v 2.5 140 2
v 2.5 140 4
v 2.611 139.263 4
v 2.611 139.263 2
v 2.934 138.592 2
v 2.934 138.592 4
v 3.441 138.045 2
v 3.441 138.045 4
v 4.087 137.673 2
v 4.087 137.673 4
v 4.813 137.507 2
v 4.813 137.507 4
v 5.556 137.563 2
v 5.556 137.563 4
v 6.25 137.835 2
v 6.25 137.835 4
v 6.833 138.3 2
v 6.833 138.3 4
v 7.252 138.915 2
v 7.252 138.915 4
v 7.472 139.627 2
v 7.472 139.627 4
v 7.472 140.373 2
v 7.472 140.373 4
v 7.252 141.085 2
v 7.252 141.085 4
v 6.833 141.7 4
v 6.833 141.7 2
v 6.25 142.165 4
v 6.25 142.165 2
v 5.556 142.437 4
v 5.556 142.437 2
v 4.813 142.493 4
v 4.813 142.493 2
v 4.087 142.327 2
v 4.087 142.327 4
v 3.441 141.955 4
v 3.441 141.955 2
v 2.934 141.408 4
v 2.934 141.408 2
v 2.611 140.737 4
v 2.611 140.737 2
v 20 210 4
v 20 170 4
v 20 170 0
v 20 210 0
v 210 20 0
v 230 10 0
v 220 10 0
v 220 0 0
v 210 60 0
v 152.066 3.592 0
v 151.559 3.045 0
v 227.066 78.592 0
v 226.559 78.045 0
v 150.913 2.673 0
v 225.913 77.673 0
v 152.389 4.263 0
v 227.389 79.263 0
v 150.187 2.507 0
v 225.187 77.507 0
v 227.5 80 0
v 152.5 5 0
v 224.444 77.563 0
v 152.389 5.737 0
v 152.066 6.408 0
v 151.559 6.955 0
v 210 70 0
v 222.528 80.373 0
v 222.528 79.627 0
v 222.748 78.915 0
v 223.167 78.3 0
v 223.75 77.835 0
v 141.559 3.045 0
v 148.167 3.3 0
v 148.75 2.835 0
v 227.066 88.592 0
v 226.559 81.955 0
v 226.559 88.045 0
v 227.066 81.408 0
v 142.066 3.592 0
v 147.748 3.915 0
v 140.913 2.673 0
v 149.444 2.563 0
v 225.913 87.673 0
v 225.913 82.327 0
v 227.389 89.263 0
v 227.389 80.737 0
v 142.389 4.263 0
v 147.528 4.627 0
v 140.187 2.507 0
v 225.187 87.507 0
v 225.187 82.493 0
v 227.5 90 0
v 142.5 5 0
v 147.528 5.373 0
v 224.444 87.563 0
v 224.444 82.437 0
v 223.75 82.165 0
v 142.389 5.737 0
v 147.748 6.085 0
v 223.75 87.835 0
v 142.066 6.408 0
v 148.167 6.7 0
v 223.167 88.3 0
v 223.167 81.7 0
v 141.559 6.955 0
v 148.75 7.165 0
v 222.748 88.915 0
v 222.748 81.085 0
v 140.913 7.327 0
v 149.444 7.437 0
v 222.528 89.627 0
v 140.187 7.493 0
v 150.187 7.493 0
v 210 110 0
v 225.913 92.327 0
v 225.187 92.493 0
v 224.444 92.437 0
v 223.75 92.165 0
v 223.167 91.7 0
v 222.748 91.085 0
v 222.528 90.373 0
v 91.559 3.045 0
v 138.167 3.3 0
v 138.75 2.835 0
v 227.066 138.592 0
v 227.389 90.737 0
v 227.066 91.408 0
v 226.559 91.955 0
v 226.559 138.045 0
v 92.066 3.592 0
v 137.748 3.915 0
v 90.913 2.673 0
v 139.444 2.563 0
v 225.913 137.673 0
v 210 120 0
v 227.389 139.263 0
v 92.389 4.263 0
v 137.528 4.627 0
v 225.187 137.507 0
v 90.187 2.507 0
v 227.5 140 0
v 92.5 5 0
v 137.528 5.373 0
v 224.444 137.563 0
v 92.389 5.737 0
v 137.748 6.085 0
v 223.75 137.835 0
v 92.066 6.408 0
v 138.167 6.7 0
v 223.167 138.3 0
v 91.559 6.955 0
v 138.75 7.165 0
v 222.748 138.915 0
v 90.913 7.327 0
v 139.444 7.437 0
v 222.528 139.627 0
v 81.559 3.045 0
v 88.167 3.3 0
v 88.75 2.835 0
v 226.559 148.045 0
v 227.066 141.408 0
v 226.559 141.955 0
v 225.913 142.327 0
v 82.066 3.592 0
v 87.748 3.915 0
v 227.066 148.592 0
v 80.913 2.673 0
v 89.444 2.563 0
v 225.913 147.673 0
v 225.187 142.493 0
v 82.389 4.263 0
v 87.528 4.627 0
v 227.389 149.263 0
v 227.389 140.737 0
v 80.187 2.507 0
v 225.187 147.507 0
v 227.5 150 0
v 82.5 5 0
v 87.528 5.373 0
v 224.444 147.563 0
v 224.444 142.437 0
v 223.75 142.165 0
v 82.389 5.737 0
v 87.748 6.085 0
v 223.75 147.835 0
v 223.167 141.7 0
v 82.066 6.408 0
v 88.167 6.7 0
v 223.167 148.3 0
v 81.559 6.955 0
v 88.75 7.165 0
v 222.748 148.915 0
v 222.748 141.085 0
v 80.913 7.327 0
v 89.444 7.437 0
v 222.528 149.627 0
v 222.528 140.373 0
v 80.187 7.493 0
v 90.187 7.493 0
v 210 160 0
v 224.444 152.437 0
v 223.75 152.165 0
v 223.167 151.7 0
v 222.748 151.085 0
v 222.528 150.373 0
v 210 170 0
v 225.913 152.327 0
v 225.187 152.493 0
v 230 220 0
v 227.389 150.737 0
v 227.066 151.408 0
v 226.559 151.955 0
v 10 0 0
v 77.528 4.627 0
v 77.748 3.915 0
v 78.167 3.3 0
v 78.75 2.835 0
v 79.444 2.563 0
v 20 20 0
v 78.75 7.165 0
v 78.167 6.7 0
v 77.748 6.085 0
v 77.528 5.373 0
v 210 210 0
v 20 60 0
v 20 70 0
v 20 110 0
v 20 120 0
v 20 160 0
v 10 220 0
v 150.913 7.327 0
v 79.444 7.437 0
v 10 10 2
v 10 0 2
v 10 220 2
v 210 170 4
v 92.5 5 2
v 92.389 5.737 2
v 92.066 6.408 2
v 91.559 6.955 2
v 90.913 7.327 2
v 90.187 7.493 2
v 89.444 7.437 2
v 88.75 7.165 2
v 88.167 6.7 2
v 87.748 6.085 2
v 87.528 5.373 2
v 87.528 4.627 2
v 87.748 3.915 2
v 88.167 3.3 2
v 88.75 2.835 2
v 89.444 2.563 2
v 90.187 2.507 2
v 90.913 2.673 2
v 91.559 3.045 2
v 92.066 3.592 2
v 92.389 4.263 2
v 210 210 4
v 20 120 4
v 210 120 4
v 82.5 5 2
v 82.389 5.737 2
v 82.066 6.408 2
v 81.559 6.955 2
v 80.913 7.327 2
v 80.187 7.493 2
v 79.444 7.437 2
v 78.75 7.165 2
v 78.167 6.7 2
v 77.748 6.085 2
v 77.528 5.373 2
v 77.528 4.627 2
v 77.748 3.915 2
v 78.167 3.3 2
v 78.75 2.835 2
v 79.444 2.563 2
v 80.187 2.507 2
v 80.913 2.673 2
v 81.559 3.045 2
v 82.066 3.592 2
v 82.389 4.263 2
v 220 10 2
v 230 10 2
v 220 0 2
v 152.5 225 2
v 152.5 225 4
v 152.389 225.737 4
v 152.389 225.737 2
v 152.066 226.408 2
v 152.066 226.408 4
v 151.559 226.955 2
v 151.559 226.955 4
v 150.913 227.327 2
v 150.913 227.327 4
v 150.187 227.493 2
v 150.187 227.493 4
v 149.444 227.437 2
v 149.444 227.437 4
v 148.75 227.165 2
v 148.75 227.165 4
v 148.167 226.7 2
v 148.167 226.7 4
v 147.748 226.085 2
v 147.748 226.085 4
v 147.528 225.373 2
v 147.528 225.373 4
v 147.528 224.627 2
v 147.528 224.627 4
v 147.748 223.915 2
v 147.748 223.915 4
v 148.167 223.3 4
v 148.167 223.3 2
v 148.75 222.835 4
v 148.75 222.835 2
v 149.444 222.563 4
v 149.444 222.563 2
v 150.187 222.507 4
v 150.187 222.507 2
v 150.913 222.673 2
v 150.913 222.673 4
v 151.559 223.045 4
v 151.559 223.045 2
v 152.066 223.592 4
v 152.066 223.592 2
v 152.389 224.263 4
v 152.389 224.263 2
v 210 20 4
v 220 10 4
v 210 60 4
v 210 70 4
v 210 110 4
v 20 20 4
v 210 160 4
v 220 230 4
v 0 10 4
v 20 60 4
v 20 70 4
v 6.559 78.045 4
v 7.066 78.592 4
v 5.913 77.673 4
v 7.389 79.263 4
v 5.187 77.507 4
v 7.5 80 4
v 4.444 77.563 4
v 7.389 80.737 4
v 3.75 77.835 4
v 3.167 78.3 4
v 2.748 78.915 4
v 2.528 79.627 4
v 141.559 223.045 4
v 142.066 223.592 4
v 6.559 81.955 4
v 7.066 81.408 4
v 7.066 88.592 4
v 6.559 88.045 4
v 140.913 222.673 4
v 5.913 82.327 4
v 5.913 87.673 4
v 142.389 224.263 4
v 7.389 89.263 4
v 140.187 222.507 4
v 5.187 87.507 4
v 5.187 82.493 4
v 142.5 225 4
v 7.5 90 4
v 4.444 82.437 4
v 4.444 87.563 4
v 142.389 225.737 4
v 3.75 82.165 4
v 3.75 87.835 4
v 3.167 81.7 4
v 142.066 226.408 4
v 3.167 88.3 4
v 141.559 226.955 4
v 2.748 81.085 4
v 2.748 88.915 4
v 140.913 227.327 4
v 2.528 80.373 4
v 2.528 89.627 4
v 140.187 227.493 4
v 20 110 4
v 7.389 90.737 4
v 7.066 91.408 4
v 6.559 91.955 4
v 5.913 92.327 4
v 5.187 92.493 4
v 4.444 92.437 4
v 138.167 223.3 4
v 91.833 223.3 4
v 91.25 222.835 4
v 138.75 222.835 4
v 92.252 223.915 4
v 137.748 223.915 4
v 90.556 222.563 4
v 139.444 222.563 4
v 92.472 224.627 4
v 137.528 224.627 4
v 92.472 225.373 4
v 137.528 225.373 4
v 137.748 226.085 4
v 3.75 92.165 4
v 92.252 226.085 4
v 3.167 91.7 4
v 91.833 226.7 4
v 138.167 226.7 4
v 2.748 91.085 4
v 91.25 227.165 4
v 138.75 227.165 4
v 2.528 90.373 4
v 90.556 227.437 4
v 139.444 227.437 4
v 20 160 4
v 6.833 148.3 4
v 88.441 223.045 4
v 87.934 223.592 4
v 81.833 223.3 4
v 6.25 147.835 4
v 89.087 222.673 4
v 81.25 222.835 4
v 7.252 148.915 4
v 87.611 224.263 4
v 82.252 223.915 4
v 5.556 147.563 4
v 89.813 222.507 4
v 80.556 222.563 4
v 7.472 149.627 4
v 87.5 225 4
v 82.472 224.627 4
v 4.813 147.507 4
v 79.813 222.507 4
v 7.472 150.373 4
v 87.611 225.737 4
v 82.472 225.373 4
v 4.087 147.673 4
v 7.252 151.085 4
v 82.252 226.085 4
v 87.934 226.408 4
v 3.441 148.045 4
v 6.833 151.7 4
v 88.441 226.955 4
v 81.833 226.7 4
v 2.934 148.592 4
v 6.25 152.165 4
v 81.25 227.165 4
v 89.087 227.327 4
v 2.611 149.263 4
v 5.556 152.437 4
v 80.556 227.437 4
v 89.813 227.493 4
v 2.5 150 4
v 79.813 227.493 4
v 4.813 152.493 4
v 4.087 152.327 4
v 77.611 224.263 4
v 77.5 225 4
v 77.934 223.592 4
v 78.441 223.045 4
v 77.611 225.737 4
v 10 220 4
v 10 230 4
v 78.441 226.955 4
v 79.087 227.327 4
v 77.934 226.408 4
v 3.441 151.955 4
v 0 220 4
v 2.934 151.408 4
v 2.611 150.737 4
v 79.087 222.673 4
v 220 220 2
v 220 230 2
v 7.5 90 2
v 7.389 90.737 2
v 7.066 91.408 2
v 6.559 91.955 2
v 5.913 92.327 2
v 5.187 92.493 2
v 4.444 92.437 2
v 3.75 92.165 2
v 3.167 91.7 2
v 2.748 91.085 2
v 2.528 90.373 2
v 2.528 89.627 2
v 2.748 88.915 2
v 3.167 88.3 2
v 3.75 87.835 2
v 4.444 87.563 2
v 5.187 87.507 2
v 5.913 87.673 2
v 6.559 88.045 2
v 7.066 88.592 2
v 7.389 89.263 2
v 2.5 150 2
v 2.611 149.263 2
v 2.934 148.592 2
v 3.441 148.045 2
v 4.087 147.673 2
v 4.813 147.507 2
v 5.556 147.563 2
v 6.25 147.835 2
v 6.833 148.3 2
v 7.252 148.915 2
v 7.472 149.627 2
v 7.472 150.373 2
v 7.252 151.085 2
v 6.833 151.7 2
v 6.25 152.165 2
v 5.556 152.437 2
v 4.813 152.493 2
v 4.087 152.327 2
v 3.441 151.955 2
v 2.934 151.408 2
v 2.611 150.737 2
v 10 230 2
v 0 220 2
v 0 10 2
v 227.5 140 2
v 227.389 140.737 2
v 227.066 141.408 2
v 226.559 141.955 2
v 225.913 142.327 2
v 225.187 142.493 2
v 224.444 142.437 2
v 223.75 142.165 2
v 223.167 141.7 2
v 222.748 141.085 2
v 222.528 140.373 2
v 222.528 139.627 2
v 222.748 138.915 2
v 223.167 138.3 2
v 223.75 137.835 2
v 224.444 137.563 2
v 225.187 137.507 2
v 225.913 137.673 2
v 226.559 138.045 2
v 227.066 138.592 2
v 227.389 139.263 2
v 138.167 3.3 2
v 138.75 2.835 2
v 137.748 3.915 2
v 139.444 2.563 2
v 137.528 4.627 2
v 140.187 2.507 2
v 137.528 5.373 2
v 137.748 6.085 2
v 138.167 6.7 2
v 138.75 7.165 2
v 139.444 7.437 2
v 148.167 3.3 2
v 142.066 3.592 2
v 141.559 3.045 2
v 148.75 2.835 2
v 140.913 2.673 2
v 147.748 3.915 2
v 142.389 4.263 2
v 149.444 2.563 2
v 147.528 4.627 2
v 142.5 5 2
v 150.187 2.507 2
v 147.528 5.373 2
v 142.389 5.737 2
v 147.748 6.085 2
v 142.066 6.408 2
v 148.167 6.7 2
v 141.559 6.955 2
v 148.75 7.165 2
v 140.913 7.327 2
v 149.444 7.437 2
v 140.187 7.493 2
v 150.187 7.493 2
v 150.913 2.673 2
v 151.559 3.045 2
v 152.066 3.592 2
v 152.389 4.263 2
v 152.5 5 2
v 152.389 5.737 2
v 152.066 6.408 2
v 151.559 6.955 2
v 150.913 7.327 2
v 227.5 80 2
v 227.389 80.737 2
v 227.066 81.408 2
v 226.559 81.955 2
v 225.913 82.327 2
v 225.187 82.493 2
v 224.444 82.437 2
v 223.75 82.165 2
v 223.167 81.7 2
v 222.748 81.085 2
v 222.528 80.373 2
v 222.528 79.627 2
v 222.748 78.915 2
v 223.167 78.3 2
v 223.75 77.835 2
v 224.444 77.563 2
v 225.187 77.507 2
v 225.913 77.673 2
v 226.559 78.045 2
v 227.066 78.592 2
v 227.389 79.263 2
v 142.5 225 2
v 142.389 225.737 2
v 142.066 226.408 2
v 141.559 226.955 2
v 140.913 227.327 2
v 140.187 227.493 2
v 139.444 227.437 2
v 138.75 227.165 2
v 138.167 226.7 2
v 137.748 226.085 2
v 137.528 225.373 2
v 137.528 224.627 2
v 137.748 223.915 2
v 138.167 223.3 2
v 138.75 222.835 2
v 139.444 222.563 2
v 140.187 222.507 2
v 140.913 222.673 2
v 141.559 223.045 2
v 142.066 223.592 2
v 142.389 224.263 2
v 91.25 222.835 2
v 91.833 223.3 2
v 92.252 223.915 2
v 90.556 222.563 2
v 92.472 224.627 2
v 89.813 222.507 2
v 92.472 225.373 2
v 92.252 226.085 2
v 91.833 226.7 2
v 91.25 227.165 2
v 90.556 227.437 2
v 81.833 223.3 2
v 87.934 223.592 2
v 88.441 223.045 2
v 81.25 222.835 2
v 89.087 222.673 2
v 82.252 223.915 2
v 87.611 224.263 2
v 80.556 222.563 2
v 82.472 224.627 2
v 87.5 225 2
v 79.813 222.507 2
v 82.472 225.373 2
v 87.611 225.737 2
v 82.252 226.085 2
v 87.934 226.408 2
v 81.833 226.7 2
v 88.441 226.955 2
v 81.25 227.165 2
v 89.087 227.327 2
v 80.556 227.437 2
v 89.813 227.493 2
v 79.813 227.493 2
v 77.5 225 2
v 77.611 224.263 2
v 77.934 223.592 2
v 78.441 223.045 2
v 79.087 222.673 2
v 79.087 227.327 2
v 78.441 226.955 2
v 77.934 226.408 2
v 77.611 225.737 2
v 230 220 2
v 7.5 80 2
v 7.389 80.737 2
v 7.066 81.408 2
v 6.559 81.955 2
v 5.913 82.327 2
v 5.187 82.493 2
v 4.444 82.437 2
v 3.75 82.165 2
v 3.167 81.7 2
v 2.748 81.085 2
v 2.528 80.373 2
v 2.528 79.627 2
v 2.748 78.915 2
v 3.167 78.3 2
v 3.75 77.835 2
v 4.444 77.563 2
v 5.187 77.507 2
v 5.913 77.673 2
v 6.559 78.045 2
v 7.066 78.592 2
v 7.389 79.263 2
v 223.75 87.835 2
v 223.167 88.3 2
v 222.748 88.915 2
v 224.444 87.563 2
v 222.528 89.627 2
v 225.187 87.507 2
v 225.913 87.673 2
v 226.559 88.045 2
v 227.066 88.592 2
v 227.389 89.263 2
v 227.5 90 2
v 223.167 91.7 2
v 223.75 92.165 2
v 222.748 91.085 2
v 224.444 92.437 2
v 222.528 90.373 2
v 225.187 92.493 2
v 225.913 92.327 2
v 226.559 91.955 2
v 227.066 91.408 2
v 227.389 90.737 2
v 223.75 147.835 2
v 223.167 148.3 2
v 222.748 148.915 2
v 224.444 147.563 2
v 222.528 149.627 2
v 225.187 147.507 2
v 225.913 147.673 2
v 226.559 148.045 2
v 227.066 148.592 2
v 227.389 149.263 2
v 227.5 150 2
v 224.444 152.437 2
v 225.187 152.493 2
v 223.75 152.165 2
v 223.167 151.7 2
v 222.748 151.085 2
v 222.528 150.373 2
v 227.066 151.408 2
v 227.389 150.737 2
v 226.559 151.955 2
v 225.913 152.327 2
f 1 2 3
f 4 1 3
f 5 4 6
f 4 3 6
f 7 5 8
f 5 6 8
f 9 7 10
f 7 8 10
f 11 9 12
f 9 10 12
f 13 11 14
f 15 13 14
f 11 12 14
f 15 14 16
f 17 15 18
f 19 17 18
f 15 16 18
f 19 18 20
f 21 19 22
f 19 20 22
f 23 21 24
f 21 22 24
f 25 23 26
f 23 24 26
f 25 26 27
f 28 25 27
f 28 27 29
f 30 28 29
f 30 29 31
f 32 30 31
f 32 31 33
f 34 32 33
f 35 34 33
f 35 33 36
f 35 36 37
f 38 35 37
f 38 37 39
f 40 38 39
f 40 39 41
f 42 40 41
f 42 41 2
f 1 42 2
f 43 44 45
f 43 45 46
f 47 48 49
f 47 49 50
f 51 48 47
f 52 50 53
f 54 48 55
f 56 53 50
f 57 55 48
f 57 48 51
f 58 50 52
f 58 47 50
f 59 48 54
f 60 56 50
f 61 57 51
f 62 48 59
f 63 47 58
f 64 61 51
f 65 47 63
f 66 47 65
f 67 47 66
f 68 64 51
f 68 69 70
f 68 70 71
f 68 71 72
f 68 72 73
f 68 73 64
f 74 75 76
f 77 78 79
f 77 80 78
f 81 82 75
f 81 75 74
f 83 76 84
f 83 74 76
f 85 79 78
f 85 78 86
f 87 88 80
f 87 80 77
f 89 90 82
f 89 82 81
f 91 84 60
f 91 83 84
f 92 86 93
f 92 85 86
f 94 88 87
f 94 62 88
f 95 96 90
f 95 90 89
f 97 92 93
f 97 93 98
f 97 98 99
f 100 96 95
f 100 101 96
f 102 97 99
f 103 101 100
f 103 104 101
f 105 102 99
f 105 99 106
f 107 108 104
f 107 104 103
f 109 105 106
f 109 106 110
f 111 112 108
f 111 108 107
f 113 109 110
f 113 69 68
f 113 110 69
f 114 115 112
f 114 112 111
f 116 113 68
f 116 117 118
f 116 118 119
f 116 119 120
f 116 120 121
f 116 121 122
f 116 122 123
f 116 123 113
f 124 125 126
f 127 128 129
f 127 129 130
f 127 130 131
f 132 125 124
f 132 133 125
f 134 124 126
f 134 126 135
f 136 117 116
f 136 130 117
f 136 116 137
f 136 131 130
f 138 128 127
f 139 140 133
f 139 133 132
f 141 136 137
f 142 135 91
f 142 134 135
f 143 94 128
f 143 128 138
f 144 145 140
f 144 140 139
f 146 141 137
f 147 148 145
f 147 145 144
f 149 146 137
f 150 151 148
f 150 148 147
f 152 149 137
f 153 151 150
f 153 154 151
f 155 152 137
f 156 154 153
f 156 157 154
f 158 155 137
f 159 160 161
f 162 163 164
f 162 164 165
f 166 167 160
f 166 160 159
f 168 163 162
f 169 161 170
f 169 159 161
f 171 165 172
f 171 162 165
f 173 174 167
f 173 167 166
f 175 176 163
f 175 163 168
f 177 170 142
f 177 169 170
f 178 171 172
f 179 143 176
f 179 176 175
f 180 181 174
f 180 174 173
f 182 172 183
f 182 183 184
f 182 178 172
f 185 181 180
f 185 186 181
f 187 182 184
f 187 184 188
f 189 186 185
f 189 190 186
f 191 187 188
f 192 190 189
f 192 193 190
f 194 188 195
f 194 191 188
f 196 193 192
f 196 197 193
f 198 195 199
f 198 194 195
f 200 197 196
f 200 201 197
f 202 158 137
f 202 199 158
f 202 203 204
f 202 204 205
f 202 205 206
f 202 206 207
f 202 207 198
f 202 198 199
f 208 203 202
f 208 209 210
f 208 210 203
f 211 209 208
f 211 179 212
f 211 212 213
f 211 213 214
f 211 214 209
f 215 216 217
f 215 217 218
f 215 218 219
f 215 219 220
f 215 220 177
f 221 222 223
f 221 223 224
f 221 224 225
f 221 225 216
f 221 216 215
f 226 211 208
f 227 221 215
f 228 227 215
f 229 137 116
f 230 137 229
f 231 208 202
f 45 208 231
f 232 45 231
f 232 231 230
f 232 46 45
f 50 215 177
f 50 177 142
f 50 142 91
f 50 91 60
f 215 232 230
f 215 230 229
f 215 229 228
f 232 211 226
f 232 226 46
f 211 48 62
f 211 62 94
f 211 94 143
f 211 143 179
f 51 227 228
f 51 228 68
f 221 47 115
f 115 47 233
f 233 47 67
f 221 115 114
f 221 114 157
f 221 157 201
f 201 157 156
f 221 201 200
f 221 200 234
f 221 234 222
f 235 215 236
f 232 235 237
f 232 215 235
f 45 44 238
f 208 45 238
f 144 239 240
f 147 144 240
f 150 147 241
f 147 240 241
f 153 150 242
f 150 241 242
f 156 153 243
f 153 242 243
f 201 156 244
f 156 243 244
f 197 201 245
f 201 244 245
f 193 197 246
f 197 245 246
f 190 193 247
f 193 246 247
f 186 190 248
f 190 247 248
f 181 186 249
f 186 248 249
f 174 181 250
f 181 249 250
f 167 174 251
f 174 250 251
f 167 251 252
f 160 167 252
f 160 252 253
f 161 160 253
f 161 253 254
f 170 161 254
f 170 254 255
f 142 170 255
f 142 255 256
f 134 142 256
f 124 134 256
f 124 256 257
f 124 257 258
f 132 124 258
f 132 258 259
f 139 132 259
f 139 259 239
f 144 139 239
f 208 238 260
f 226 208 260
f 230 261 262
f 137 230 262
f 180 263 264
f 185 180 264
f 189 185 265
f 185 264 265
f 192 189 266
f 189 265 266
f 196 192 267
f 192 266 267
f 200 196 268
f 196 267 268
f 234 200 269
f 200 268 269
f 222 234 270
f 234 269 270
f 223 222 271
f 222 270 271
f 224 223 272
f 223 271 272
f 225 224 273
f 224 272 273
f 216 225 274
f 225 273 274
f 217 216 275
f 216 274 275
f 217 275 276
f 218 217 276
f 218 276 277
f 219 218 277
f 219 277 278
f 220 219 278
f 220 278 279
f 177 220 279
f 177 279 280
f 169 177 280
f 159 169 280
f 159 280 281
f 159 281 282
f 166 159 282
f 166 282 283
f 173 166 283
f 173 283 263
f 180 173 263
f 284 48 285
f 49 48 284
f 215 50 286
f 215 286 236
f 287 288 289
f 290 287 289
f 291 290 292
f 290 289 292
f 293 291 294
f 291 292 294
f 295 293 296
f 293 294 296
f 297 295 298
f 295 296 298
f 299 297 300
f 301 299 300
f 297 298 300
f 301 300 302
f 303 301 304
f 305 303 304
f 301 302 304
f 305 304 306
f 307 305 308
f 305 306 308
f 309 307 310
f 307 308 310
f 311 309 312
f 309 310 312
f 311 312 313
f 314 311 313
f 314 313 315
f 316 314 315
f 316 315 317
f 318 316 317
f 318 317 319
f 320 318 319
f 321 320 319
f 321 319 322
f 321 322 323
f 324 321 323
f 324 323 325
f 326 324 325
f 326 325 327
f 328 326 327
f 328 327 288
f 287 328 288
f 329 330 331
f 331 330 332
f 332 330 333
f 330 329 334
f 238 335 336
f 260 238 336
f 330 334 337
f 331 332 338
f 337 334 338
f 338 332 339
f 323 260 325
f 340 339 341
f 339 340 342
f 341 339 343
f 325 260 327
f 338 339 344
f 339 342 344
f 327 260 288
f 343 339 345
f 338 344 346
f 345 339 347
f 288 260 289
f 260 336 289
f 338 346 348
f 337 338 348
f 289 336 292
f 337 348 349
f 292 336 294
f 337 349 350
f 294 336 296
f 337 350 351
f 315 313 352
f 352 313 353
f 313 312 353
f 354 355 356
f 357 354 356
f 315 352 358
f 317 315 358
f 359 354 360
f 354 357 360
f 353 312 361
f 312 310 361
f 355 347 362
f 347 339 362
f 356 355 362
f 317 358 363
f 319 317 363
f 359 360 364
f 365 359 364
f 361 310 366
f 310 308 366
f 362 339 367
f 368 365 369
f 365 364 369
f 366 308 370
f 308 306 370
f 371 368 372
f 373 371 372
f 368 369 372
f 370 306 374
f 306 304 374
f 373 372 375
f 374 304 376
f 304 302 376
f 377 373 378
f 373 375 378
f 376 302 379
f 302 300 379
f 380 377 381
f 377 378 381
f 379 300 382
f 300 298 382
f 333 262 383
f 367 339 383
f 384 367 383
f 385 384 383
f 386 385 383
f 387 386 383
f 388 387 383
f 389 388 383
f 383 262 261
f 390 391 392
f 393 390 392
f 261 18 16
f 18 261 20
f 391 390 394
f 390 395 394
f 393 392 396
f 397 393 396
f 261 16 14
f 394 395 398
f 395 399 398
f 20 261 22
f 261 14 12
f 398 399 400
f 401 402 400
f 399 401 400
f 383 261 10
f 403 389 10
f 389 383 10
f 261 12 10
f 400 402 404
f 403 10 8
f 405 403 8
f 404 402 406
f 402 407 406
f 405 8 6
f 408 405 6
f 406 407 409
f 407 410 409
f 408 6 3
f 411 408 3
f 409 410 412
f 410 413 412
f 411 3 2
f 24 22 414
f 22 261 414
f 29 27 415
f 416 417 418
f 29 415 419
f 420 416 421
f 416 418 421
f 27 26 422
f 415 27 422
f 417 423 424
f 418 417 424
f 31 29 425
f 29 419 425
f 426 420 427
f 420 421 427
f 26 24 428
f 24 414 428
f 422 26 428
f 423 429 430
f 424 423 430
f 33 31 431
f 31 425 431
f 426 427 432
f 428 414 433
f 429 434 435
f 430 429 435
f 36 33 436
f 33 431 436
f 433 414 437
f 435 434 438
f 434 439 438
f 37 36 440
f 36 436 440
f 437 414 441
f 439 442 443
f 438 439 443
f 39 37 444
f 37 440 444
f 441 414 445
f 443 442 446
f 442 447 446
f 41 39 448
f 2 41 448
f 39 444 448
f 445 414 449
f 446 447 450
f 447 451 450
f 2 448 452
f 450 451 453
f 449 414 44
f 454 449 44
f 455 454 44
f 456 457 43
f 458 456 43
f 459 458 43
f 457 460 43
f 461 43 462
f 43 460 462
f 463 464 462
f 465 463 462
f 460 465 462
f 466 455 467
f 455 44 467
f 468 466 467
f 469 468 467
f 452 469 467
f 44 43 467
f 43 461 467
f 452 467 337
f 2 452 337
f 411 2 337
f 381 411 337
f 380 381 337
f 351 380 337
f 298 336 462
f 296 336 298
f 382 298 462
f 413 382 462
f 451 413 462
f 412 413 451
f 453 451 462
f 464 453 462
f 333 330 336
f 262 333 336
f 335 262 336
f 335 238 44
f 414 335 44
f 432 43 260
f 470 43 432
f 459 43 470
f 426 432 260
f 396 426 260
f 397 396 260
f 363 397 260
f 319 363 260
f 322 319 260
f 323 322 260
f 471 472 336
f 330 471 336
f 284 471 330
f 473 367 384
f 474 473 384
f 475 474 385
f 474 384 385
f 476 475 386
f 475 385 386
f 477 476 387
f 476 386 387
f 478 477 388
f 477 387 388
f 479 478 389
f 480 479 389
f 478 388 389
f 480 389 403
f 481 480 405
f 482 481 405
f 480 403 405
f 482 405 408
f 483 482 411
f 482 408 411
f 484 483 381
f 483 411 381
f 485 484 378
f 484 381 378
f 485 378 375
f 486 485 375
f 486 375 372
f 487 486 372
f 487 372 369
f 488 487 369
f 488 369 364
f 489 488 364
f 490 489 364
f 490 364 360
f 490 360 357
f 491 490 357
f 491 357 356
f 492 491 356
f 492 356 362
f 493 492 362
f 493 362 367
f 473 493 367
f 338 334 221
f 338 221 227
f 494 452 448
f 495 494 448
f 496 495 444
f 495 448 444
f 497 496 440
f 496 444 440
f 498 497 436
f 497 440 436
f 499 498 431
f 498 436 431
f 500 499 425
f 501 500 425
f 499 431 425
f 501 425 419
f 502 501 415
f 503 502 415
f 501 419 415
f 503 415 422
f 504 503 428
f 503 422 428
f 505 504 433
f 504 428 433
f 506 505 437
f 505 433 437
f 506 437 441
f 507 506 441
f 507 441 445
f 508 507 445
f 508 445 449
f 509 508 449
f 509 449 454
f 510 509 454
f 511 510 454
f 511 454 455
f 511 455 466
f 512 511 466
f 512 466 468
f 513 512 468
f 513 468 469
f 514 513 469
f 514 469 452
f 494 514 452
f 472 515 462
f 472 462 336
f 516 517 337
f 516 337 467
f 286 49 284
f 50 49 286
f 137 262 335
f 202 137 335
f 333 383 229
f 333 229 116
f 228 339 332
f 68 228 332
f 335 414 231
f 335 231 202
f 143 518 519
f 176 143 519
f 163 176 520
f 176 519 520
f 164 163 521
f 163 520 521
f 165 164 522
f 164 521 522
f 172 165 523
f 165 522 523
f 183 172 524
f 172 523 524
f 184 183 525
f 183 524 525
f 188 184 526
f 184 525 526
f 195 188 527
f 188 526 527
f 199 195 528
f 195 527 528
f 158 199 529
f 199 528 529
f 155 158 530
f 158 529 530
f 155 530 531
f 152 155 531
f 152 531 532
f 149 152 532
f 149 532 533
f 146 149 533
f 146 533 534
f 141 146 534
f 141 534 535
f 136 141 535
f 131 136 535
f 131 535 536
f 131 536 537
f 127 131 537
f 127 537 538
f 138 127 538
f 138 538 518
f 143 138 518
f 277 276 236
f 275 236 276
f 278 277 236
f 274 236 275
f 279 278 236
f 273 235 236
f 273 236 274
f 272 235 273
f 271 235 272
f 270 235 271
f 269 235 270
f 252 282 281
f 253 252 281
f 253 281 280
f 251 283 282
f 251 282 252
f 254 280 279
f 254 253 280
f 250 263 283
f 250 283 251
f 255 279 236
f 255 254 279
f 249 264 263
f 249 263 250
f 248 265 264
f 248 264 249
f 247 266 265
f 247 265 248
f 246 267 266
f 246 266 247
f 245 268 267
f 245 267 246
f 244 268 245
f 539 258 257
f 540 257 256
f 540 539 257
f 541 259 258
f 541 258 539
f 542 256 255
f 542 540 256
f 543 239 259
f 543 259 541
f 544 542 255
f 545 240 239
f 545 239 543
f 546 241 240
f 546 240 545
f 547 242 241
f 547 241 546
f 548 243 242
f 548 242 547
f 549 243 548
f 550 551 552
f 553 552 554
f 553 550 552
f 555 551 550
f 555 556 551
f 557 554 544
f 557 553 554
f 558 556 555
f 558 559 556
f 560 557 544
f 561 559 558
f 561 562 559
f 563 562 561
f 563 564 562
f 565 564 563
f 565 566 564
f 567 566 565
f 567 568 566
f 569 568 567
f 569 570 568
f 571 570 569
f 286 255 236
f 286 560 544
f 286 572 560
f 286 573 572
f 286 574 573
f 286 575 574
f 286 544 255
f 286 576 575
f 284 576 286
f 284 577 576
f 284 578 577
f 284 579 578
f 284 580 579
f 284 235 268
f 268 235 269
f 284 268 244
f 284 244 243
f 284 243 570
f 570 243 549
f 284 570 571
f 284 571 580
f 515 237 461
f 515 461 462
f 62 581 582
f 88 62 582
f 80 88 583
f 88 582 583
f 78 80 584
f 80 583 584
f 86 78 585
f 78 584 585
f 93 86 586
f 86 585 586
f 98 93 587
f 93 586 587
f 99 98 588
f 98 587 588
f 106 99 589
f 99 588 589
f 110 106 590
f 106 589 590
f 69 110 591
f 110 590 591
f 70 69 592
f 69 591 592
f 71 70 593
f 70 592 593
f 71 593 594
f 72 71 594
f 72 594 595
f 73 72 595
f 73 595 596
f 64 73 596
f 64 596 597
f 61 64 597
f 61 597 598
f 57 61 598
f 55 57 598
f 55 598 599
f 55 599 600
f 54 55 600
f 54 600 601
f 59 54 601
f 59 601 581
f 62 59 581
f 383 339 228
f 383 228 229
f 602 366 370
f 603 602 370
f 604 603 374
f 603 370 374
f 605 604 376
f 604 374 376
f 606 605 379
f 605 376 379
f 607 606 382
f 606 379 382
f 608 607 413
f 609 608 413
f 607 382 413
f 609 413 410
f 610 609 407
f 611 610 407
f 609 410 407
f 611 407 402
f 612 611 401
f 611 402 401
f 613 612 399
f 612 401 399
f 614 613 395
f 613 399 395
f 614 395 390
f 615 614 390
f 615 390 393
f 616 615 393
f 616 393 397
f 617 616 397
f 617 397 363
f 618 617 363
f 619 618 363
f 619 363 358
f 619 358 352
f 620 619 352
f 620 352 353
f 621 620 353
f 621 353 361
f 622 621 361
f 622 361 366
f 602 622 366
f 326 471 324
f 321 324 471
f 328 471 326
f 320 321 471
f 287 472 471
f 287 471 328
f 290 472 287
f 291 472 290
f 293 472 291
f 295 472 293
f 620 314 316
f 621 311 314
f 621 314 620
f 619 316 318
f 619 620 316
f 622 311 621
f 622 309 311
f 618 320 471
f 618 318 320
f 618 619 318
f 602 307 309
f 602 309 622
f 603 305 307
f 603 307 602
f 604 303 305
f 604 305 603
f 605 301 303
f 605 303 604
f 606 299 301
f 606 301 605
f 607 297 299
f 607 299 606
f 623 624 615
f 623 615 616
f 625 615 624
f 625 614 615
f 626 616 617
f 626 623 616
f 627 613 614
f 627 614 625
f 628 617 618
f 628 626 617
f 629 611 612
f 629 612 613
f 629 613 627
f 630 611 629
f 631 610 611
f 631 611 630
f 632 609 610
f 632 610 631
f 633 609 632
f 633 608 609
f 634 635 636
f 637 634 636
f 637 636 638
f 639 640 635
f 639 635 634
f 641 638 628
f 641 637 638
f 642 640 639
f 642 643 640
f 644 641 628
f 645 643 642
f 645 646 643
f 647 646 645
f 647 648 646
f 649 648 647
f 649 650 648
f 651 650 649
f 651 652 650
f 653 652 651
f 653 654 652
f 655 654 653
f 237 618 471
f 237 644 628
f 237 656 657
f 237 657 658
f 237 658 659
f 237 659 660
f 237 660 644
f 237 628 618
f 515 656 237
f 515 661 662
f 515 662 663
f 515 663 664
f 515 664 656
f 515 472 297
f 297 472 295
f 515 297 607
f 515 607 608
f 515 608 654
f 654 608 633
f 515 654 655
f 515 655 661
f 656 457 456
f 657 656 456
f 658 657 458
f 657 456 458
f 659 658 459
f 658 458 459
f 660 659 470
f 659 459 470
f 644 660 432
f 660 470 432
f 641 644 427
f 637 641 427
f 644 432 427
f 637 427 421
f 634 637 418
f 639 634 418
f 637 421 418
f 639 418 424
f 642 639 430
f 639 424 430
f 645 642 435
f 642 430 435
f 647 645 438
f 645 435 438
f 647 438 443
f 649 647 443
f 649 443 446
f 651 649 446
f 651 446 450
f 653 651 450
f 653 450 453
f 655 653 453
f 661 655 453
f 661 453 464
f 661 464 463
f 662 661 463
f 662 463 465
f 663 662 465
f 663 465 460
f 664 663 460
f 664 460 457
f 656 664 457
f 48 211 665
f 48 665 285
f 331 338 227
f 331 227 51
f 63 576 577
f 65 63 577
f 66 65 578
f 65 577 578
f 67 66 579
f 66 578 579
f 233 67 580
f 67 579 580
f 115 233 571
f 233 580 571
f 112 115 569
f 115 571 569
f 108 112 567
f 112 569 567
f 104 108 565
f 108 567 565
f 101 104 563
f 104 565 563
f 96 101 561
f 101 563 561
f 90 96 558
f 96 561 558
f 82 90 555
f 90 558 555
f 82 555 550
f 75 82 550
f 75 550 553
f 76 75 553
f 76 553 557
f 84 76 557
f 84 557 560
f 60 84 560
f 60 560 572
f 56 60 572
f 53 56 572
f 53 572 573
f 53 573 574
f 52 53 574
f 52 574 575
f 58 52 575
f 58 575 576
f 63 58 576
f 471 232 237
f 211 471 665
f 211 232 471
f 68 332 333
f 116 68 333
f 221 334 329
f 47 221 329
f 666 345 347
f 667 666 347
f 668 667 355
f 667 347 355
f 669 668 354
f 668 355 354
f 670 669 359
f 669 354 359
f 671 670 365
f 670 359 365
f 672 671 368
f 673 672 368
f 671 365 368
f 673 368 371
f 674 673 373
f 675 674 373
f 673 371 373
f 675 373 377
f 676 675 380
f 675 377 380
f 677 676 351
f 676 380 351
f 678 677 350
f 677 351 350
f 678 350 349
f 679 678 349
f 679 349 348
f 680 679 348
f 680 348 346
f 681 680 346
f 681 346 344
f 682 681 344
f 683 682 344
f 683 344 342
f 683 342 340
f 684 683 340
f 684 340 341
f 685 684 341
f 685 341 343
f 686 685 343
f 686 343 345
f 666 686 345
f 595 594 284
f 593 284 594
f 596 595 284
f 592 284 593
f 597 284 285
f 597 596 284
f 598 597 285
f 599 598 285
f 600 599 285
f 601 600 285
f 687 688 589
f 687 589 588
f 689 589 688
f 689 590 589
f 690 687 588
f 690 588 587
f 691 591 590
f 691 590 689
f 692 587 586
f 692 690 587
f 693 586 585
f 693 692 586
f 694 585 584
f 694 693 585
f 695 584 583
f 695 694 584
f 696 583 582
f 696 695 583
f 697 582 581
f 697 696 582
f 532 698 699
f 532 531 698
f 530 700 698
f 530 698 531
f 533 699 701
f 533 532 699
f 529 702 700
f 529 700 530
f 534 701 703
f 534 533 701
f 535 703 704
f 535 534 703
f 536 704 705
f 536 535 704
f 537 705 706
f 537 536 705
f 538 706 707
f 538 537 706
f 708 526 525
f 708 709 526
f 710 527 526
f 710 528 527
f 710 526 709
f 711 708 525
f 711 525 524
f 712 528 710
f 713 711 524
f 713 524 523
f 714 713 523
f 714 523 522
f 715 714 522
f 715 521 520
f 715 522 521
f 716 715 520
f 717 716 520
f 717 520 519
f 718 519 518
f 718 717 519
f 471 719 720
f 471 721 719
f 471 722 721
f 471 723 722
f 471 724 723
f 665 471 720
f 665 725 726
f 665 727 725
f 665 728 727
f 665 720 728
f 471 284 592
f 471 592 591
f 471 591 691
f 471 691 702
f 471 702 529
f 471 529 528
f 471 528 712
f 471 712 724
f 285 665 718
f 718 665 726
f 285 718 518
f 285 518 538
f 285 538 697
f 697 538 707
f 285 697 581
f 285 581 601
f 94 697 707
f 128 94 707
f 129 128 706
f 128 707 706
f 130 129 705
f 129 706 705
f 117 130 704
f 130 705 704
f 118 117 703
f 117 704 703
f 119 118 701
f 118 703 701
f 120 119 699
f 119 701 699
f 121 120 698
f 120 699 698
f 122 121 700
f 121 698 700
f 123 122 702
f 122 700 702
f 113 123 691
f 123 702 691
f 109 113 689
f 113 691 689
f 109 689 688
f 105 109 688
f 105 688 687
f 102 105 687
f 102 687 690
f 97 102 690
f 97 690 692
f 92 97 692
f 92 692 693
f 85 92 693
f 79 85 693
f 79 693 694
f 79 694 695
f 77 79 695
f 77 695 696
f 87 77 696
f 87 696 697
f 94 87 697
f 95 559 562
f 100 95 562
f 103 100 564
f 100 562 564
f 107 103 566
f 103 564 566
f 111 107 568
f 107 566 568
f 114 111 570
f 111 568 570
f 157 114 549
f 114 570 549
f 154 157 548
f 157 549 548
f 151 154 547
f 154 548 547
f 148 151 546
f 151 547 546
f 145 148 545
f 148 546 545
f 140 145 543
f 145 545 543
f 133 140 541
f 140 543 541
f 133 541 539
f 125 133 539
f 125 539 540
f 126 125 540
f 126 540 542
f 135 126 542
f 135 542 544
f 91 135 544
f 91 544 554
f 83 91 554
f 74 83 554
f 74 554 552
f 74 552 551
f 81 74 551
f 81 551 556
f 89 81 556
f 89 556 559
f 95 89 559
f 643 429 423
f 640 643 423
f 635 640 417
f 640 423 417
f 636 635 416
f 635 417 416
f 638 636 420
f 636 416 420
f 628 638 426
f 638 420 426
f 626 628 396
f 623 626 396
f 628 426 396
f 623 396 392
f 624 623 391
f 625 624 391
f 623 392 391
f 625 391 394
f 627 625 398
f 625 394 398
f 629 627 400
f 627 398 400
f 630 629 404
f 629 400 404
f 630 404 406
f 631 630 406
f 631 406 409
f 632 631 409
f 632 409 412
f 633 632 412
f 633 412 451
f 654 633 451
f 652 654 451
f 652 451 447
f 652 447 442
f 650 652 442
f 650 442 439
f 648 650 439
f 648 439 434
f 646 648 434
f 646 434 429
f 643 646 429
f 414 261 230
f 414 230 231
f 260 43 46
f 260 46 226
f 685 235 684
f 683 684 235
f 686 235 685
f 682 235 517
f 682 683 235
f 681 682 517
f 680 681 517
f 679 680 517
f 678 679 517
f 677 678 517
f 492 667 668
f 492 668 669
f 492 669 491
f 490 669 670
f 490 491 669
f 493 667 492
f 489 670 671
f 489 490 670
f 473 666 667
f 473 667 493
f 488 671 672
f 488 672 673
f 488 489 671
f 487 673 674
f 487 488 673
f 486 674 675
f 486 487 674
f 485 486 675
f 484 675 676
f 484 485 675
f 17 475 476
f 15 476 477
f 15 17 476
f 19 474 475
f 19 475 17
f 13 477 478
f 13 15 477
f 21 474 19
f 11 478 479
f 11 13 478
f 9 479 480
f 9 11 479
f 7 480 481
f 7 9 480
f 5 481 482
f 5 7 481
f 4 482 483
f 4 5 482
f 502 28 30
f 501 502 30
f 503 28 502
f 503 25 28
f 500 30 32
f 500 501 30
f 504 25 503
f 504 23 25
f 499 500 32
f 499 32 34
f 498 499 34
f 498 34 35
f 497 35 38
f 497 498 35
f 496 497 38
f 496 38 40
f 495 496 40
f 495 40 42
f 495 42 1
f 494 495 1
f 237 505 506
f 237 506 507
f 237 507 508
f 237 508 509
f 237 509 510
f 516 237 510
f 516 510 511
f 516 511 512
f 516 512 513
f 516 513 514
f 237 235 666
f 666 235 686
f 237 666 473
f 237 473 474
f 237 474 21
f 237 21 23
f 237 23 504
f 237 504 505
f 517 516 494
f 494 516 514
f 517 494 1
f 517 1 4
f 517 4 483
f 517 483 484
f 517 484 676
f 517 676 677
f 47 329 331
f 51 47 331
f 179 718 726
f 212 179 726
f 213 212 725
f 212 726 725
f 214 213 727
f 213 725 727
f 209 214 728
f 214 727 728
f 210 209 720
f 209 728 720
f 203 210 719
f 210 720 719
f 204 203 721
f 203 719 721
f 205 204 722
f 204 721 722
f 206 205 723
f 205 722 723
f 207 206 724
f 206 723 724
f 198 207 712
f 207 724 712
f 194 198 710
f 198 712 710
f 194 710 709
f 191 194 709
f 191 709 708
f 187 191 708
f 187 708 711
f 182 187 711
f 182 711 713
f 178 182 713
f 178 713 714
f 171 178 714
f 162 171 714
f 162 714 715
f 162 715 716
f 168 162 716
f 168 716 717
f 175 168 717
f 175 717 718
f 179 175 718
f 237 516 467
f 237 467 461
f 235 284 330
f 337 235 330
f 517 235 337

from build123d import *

# Parameters (mm, degrees)
EXTRUDE_1_DEPTH     = 4
SKETCH_2_W          = 10
SKETCH_2_H          = 210
SKETCH_2_W_2        = 210
SKETCH_2_H_2        = 10
CUT_EXTRUDE_1_DEPTH = 2
SKETCH_3_W          = 210
SKETCH_3_H          = 10
SKETCH_3_W_2        = 10
SKETCH_3_H_2        = 210
CUT_EXTRUDE_2_DEPTH = 2
SKETCH_4_R          = 2.5
CUT_EXTRUDE_3_DEPTH = 326.293713434
SKETCH_5_W          = 190
SKETCH_5_H          = 40
CUT_EXTRUDE_4_DEPTH = 326.293713434


with BuildPart() as part:
    # 草图1 → 凸台-拉伸1 (new body)
    with BuildSketch(Plane.XY):
        Polygon((10, 0), (10, 10), (0, 10), (0, 220), (10, 220), (10, 230), (220, 230), (220, 220), (230, 220), (230, 10), (220, 10), (220, 0), align=None)
    extrude(amount=EXTRUDE_1_DEPTH)

    # 草图2 → 切除-拉伸1 (cut)
    with BuildSketch(Plane.XY.offset(4)):
        with Locations((225, 115)):
            Rectangle(SKETCH_2_W, SKETCH_2_H)
        with Locations((115, 5)):
            Rectangle(SKETCH_2_W_2, SKETCH_2_H_2)
    extrude(amount=-CUT_EXTRUDE_1_DEPTH, mode=Mode.SUBTRACT)

    # 草图3 → 切除-拉伸2 (cut)
    with BuildSketch(Plane(origin=(0, 0, 0), x_dir=(-1, 0, 0), z_dir=(0, 0, -1))):
        with Locations((-115, 225)):
            Rectangle(SKETCH_3_W, SKETCH_3_H)
        with Locations((-5, 115)):
            Rectangle(SKETCH_3_W_2, SKETCH_3_H_2)
    extrude(amount=-CUT_EXTRUDE_2_DEPTH, mode=Mode.SUBTRACT)

    # 草图4 → 切除-拉伸3 (cut, through all)
    with BuildSketch(Plane.XY.offset(4)):
        with Locations((5, 80)):
            Circle(SKETCH_4_R)
        with Locations((5, 90)):
            Circle(SKETCH_4_R)
        with Locations(Location((5, 150, 0), (0, 0, 180))):
            Circle(SKETCH_4_R)
        with Locations(Location((5, 140, 0), (0, 0, 180))):
            Circle(SKETCH_4_R)
        with Locations((225, 80)):
            Circle(SKETCH_4_R)
        with Locations((225, 90)):
            Circle(SKETCH_4_R)
        with Locations((225, 140)):
            Circle(SKETCH_4_R)
        with Locations((225, 150)):
            Circle(SKETCH_4_R)
        with Locations((80, 5)):
            Circle(SKETCH_4_R)
        with Locations((90, 5)):
            Circle(SKETCH_4_R)
        with Locations((140, 5)):
            Circle(SKETCH_4_R)
        with Locations((150, 5)):
            Circle(SKETCH_4_R)
        with Locations((150, 225)):
            Circle(SKETCH_4_R)
        with Locations((140, 225)):
            Circle(SKETCH_4_R)
        with Locations(Location((90, 225, 0), (0, 0, 180))):
            Circle(SKETCH_4_R)
        with Locations(Location((80, 225, 0), (0, 0, 180))):
            Circle(SKETCH_4_R)
    extrude(amount=-CUT_EXTRUDE_3_DEPTH, mode=Mode.SUBTRACT)

    # 草图5 → 切除-拉伸4 (cut, through all)
    with BuildSketch(Plane.XY.offset(4)):
        with Locations((115, 40)):
            Rectangle(SKETCH_5_W, SKETCH_5_H)
        with Locations((115, 90)):
            Rectangle(SKETCH_5_W, SKETCH_5_H)
        with Locations((115, 140)):
            Rectangle(SKETCH_5_W, SKETCH_5_H)
        with Locations((115, 190)):
            Rectangle(SKETCH_5_W, SKETCH_5_H)
    extrude(amount=-CUT_EXTRUDE_4_DEPTH, mode=Mode.SUBTRACT)


solid = part.part
